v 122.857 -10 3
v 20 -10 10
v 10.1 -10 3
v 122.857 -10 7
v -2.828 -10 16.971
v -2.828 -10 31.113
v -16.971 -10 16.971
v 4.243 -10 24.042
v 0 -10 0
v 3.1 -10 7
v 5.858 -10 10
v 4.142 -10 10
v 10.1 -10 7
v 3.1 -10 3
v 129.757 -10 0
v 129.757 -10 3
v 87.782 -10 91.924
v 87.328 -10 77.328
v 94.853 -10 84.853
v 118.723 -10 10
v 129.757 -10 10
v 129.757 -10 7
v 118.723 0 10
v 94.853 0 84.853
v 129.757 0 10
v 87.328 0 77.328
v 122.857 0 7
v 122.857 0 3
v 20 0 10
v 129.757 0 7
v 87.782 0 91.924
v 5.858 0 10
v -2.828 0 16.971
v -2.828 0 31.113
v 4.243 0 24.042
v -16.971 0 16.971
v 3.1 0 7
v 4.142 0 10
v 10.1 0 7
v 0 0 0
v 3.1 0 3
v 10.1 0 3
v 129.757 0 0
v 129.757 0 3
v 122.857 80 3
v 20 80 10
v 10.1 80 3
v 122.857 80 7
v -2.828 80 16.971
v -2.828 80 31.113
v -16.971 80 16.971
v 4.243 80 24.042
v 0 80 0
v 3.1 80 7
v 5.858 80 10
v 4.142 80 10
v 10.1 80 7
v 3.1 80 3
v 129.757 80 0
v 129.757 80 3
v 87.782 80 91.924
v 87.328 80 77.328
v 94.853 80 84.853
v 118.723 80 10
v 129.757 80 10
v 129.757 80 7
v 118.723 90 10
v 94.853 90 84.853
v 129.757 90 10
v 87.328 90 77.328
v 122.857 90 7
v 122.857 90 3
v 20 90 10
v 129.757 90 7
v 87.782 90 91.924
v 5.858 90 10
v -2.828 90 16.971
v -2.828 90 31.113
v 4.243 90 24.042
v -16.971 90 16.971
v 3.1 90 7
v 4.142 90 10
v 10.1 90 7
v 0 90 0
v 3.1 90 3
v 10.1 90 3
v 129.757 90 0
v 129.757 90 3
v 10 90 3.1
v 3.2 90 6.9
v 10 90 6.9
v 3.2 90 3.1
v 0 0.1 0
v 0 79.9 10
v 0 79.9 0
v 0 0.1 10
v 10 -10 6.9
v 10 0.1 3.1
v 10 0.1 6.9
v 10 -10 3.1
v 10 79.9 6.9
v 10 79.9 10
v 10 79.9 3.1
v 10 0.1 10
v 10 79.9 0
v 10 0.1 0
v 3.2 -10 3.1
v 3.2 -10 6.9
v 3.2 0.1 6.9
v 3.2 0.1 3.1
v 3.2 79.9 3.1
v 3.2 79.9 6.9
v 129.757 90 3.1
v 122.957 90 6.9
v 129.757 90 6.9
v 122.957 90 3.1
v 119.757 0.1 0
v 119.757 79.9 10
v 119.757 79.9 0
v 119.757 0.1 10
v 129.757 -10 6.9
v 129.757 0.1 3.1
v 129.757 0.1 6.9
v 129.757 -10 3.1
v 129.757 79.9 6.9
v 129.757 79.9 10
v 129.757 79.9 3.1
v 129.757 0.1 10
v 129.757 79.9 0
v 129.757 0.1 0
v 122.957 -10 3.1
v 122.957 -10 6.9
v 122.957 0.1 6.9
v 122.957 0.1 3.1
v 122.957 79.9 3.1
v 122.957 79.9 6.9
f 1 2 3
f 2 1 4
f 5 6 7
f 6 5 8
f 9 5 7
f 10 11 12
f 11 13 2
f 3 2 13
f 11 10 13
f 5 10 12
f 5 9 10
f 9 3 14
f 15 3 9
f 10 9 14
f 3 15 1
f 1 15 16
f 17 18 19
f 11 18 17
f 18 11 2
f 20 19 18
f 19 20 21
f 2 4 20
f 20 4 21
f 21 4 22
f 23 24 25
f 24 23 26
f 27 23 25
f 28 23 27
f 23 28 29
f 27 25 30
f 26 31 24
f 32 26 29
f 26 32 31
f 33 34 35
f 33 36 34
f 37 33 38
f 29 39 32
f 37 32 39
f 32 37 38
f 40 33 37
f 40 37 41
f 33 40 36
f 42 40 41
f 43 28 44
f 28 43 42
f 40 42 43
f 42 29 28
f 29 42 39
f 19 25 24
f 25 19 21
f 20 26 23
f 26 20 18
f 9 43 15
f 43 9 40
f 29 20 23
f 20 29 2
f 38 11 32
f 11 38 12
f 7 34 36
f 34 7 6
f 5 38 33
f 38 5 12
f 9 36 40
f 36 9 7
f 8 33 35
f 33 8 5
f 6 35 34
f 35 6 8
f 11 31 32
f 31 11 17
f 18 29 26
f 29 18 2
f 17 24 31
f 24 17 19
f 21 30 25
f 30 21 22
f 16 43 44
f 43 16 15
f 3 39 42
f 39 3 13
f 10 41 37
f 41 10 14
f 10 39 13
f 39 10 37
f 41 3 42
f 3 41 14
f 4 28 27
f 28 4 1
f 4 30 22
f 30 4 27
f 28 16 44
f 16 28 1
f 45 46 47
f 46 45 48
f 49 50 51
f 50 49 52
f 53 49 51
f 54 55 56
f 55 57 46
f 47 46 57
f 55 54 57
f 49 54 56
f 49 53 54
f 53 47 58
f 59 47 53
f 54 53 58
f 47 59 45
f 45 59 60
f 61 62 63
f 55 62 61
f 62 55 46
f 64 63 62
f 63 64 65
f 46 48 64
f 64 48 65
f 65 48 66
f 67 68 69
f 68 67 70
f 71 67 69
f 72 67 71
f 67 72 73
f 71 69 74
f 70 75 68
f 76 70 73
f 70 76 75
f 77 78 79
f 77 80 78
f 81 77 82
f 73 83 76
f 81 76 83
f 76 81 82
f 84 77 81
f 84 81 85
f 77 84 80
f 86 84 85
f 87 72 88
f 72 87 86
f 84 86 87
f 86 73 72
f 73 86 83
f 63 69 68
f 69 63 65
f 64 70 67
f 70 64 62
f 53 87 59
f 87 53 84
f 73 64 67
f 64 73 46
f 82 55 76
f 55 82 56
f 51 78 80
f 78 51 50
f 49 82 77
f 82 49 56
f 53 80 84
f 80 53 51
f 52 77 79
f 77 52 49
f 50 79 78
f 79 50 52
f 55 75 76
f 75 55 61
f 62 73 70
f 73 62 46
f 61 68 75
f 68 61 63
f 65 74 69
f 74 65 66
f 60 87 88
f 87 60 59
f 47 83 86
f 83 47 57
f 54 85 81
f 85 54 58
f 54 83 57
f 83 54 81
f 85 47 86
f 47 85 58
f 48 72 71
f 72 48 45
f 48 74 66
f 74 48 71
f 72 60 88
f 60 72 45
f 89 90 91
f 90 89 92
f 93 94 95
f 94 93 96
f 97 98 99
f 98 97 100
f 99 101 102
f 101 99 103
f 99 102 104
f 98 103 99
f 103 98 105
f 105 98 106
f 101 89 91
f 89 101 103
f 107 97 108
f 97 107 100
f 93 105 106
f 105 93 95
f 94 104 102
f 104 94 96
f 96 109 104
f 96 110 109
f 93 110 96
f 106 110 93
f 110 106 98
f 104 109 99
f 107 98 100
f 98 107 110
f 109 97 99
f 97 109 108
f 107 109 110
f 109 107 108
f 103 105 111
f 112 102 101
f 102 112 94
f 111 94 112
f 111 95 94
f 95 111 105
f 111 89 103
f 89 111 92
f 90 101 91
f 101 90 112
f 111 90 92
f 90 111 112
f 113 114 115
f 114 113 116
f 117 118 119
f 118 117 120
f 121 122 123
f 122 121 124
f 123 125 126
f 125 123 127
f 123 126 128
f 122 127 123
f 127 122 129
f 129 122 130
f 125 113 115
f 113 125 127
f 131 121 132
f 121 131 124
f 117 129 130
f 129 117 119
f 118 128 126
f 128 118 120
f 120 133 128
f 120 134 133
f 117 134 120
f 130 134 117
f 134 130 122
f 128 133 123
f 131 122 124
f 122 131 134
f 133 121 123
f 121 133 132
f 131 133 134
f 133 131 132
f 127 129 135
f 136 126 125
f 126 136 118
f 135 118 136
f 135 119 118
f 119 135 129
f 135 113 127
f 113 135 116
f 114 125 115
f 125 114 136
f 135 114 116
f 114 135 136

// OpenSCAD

// preview[view:south west, tilt:top diagonal]

// Angle of iPad on stand;
Angle = 45; // [10:80]
// Angle of back support;
BackAngle = 25; // [10:80]
// Length of support
SupportLength = 120; // [50:240]
// Length of connecting bars
BarLength = 80; // [20:200]
Tolerance = 0.1; // [0, 0.1, 0.2, 0.3, 0.4, 0.5]


part = "Assembled"; // [Assembled: Assembled, Side: Side, Bar: Bar]


SubAngle = -(90-Angle);

SharedAngle = -SubAngle + BackAngle;
comp = (10/sin(SharedAngle));

truecomp = (SharedAngle > 90 ? comp : (SharedAngle == 90 ? 1 : 0));

echo(truecomp);


SubBackAngle = (90-BackAngle);

if(part=="Assembled")
{
	rotate([90, 0, 0]) Leg(Angle, BackAngle, SupportLength, Tolerance);
	
	translate([0, BarLength+10, 0])rotate([90, 0, 0]) Leg(Angle, BackAngle, SupportLength, Tolerance);
	rotate([-90, 0, 90]) translate([-10, -10, -10]) Bar(BarLength, Tolerance);
	rotate([-90, 0, 90]) translate([-10, -10, -10 - (cos(Angle)*SupportLength + sin(BackAngle)*(sin(Angle)*SupportLength)/cos(BackAngle)-10 + 10 - 10*tan(BackAngle))]) Bar(BarLength, Tolerance);
}
if(part=="Side")
{
	Leg(Angle, BackAngle, SupportLength, Tolerance);
}
if(part=="Bar")
{
	Bar(BarLength, Tolerance);
}

module Bar(BarLength, Tolerance)
{
	difference()
	{
		cube([BarLength+20, 10, 10]);
		translate([-0.5, 7 - Tolerance, -0.5]) cube([10.5+ Tolerance, 4 + Tolerance, 11]);
		translate([-0.5, -1 + Tolerance, -0.5]) cube([10.5+ Tolerance, 4, 11]);
		translate([-0.5, -0.5, 7 - Tolerance * 2]) cube([10.5+ Tolerance, 11, 4 + Tolerance * 2]);
		translate([BarLength+10 - Tolerance, 7 - Tolerance, -0.5]) cube([10.5 + Tolerance, 4 + Tolerance, 11]);
		translate([BarLength+10 - Tolerance, -1 + Tolerance, -0.5]) cube([10.5+ Tolerance, 4, 11]);
		translate([BarLength+10 - Tolerance, -0.5, 7 - Tolerance * 2]) cube([10.5+ Tolerance, 11, 4 + Tolerance * 2]);
	}
}

module Leg(Angle, BackAngle, SupportLength, Tolerance)
{
difference()
{
	union()
	{
		cube([10, 10, 10]);
		rotate([0, 0, SubAngle]) translate([-24, 0, 0]) cube([24, 10, 10]);
		rotate([0, 0, Angle]) translate([0, 14, 0]) cube([20, 10, 10]);
//		rotate([0, 0, SubAngle]) translate([-14, 10, 0]) %cube([10, 10, 10]);
		translate([10, 0, 0]) rotate([0, 0, Angle]) translate([0, 0, 0]) cube([SupportLength, 10, 10]);
		
		difference()
		{
			cube([cos(Angle)*SupportLength + sin(BackAngle)*(sin(Angle)*SupportLength)/cos(BackAngle) + 10 - 10*tan(BackAngle), 10, 10]);
//			translate([10, 0, 0]) rotate([0, 0, Angle]) translate([SupportLength, 0, 0]) rotate([0, 0, -Angle + BackAngle+90]) translate([(-sin(Angle)*SupportLength)/cos(BackAngle), -10, -0.5]) cube([(sin(Angle)*SupportLength)/cos(BackAngle), 10, 11]);
		}
		
		difference()
		{
			translate([10, 0, 0]) rotate([0, 0, Angle]) translate([SupportLength, 0, 0]) rotate([0, 0, -Angle + BackAngle+90]) translate([(-sin(Angle)*SupportLength)/cos(BackAngle), 0, 0]) cube([(sin(Angle)*SupportLength)/cos(BackAngle) + truecomp, 10, 10]);
			translate([0, -10, -0.5]) cube([cos(Angle)*SupportLength + sin(BackAngle)*(sin(Angle)*SupportLength)/cos(BackAngle) + 10*tan(SubBackAngle), 10, 11]);
		}
	}
	translate([3 + Tolerance, 3, -0.5]) cube([7, 4, 11]);
	translate([cos(Angle)*SupportLength + sin(BackAngle)*(sin(Angle)*SupportLength)/cos(BackAngle)- 7 + Tolerance + 10 - 10*tan(BackAngle), 3, -0.5]) cube([8, 4, 11]);
	translate([cos(Angle)*SupportLength + sin(BackAngle)*(sin(Angle)*SupportLength)/cos(BackAngle) + 10 - 10*tan(BackAngle), -10, -0.5]) cube([20, 20, 11]);
}
}
